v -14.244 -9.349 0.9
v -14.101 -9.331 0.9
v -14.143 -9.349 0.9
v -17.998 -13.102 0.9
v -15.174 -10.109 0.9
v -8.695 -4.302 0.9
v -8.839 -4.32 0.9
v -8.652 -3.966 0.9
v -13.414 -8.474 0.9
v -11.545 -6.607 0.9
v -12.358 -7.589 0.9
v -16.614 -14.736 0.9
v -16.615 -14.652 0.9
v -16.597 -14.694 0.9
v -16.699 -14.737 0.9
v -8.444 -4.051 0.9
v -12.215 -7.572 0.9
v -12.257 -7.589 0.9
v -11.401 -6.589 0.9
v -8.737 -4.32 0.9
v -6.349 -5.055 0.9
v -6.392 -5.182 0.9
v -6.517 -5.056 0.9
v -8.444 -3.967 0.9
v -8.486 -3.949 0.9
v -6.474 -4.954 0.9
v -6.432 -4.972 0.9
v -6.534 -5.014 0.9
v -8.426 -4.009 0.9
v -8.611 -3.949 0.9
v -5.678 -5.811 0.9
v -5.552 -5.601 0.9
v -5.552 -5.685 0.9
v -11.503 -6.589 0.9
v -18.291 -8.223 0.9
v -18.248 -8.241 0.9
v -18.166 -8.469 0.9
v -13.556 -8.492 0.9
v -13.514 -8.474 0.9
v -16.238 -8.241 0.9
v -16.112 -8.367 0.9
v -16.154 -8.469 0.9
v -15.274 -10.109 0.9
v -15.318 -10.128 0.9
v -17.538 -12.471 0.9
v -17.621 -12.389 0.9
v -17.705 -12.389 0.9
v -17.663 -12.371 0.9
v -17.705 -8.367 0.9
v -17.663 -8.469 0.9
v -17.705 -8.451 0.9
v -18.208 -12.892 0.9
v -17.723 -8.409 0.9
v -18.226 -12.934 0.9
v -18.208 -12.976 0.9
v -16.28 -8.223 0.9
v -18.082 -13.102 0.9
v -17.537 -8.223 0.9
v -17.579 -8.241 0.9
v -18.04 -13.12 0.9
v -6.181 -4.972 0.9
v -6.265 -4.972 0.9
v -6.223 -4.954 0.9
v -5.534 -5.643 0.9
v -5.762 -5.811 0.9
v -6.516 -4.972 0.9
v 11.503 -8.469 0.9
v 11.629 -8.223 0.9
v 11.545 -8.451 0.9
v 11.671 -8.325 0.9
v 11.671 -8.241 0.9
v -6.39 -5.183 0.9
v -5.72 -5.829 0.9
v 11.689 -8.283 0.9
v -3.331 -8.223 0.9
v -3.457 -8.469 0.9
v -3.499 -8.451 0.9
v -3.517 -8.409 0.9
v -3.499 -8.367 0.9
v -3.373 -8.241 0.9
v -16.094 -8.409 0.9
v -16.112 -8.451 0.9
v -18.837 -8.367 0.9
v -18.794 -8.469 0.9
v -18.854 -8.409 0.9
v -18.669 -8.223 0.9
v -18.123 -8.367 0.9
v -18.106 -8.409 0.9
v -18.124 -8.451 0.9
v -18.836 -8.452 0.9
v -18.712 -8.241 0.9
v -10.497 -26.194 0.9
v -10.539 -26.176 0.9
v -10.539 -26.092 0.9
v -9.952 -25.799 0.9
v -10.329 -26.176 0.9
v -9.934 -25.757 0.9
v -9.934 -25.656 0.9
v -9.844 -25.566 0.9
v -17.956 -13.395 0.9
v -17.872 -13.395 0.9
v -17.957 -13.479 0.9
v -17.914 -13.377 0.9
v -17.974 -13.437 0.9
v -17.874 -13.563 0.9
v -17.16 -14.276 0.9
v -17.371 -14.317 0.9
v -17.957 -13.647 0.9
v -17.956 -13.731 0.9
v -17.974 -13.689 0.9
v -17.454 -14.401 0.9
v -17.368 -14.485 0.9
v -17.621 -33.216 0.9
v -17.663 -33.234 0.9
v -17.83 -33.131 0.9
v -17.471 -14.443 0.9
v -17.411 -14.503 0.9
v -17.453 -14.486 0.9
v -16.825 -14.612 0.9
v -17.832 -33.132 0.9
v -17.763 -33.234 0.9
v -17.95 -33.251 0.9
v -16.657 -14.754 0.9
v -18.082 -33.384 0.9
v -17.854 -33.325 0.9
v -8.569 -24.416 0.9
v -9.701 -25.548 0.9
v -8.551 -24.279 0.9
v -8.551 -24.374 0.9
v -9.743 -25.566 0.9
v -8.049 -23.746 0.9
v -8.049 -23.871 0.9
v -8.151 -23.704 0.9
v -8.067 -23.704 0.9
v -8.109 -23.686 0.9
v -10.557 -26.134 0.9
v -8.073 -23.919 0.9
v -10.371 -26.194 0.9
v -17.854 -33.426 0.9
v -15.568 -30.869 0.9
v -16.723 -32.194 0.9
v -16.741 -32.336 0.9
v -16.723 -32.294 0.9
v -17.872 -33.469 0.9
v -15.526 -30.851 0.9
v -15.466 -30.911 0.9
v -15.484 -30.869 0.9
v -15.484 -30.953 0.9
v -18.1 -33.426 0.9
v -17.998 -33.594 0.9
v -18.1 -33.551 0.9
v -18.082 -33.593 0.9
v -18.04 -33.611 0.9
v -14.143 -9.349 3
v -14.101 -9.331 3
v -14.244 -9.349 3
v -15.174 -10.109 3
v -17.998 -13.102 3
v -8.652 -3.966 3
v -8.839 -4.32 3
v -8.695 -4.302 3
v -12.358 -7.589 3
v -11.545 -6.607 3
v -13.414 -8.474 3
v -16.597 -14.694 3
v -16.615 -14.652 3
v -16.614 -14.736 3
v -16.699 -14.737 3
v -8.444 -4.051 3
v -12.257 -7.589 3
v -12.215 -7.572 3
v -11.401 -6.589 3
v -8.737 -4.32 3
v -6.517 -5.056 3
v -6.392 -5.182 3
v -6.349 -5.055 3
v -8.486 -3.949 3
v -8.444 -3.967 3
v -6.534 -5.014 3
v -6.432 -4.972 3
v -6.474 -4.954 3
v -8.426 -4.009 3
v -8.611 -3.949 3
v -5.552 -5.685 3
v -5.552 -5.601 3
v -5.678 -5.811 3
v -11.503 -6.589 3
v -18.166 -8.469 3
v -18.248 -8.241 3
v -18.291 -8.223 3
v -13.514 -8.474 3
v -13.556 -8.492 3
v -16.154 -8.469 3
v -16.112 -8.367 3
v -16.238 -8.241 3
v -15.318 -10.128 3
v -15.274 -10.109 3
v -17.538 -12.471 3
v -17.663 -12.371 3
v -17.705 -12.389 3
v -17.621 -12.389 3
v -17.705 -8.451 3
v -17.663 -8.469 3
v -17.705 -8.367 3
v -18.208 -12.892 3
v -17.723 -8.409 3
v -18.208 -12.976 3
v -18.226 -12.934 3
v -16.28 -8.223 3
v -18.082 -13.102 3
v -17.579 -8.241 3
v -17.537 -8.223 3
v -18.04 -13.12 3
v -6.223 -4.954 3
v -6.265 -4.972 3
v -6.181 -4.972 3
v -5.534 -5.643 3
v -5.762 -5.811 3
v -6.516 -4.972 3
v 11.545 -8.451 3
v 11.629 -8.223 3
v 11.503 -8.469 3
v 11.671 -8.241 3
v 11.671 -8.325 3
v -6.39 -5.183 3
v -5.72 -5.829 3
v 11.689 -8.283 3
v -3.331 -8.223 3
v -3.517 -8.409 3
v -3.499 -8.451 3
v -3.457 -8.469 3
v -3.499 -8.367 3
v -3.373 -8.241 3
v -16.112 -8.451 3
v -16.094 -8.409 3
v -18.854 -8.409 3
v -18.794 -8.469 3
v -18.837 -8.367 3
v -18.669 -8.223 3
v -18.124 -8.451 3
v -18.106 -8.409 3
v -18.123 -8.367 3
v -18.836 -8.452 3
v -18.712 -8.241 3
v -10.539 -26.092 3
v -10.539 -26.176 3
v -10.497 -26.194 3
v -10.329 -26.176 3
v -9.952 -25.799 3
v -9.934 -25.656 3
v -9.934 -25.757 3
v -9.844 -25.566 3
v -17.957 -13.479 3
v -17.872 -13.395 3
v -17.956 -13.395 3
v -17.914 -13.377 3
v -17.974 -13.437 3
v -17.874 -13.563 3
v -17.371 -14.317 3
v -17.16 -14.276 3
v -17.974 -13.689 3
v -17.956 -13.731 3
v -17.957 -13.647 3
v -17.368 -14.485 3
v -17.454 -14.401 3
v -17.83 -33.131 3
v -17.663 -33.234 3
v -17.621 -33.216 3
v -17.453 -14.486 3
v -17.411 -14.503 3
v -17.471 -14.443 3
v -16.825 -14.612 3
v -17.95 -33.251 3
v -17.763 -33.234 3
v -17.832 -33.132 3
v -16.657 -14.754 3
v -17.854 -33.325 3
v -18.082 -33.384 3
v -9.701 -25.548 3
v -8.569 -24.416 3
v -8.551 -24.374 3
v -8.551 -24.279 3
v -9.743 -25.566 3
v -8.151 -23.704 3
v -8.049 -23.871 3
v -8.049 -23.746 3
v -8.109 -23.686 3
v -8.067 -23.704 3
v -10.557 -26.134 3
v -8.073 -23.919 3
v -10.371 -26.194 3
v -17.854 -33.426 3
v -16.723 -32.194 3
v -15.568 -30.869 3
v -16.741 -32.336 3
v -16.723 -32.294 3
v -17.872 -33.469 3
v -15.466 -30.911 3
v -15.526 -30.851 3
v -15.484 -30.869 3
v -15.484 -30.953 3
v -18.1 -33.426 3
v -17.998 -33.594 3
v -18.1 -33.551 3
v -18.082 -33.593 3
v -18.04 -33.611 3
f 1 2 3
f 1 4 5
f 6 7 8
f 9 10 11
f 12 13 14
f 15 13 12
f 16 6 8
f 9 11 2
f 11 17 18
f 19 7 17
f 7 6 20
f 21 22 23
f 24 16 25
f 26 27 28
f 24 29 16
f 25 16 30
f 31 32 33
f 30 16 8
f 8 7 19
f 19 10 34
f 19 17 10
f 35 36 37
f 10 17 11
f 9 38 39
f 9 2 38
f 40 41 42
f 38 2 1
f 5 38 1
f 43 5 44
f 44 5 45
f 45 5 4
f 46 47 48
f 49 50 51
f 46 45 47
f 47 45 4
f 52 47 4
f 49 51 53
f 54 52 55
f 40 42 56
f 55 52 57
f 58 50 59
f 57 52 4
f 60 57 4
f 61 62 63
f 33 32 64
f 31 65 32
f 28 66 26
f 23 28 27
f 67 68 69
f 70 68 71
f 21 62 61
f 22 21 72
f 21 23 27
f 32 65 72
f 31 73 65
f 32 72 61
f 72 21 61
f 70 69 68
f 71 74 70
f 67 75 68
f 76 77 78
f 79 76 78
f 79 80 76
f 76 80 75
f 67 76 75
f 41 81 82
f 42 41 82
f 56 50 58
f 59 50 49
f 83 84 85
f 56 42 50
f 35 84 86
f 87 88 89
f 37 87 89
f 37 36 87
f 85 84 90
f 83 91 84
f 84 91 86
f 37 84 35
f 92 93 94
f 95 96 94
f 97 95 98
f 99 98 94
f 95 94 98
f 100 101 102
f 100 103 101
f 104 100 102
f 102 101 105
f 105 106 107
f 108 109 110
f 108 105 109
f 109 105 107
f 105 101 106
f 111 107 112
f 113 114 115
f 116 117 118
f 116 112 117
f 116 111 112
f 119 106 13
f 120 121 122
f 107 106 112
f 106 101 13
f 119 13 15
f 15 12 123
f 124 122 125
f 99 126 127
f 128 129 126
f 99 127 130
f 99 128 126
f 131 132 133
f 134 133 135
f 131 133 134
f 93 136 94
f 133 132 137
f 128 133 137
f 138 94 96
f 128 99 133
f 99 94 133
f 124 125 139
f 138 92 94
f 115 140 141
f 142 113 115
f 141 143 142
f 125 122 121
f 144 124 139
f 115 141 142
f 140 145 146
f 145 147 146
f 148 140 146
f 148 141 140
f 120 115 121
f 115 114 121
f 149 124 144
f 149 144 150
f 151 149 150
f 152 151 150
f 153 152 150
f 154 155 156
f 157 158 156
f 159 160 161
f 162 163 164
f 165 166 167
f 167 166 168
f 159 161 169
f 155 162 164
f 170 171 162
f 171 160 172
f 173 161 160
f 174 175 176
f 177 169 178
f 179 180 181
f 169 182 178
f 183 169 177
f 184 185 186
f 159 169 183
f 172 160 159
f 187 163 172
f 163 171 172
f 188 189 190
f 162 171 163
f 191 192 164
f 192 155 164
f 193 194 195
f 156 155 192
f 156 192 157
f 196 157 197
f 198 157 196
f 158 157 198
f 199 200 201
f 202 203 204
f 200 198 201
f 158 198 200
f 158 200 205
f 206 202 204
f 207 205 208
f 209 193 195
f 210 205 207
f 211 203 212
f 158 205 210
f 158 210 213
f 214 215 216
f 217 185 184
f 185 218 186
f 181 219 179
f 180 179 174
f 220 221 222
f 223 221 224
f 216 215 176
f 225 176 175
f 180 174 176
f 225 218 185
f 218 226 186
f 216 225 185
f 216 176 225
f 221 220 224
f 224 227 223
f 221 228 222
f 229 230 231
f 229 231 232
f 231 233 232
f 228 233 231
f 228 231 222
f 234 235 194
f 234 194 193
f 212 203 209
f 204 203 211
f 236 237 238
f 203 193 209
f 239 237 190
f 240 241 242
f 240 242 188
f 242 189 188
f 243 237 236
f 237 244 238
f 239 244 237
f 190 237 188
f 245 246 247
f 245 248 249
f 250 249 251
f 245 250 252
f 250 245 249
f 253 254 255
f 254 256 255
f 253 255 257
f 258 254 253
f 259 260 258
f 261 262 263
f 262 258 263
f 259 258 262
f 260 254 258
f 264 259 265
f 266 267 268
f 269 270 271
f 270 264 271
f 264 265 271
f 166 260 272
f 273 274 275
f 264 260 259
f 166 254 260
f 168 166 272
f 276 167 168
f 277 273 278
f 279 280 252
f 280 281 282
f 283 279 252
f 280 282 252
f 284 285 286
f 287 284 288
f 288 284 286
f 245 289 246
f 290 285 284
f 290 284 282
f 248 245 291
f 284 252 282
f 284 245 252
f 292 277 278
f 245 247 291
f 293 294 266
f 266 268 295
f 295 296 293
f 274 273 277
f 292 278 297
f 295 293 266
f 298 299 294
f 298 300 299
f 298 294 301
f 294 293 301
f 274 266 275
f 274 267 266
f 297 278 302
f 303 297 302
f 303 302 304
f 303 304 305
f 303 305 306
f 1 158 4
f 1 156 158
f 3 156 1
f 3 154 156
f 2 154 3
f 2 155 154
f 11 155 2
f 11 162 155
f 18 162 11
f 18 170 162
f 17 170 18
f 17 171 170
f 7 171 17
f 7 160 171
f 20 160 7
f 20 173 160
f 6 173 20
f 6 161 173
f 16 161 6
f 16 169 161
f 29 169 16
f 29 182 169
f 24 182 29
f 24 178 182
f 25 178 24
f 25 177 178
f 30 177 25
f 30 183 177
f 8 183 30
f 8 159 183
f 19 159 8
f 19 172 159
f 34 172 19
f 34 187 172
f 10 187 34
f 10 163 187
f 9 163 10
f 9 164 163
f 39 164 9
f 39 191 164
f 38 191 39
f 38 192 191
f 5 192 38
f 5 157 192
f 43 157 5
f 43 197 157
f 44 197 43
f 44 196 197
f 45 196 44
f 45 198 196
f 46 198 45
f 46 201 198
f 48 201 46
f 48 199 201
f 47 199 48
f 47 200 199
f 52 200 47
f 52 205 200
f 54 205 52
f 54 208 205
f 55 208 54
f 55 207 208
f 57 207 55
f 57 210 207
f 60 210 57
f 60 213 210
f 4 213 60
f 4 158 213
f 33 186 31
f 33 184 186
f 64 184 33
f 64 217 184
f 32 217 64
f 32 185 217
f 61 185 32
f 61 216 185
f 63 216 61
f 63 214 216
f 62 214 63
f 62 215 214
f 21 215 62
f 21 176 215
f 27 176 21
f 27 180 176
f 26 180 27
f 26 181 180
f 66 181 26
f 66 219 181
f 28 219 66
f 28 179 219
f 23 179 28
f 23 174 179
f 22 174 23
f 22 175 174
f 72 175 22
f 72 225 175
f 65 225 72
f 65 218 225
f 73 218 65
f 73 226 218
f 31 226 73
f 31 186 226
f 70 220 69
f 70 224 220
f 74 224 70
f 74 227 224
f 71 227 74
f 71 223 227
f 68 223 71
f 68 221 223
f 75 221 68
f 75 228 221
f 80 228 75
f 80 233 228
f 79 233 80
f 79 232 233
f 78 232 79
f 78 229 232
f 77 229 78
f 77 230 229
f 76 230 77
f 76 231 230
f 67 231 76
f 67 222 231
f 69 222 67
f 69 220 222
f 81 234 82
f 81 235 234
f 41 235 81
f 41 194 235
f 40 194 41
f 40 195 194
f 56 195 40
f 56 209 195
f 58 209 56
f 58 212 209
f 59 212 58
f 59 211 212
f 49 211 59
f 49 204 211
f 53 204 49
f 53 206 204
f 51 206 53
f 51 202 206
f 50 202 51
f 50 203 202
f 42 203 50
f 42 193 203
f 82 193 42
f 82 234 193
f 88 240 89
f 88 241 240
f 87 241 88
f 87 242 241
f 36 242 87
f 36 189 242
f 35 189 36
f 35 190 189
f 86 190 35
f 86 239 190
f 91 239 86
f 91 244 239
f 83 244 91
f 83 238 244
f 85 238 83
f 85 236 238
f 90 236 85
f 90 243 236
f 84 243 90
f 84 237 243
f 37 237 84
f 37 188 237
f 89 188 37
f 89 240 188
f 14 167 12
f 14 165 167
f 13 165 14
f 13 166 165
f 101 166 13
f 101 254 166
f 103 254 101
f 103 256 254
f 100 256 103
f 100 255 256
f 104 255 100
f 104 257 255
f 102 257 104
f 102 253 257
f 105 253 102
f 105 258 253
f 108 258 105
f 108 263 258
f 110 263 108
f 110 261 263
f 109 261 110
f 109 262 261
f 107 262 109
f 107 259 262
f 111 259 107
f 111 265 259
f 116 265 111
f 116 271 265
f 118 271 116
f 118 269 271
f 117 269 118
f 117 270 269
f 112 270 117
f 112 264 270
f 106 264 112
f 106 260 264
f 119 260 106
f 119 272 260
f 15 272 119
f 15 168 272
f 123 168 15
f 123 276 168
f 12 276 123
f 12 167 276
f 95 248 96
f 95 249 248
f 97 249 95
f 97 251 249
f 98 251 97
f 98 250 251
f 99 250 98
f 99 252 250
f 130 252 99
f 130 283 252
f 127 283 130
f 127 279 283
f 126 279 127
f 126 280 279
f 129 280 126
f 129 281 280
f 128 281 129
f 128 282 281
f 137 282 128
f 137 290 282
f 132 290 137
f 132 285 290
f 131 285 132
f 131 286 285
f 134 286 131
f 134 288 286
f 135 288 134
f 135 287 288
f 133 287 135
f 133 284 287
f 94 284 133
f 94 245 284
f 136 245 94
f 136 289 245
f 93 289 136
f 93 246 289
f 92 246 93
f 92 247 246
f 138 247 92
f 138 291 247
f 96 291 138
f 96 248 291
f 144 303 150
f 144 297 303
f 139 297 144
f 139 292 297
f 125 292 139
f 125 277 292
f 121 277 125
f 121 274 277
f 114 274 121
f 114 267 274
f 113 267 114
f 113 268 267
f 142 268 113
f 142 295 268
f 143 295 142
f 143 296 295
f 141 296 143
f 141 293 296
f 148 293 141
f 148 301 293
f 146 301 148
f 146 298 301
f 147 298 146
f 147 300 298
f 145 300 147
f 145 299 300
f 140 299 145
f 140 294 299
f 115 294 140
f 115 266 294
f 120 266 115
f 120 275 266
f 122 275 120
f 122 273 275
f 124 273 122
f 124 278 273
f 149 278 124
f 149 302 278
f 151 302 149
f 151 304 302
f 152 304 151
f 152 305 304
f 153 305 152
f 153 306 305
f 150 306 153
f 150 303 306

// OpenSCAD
$fn = 24;
translate([0, -2.500, 0.900])
  linear_extrude(height=2.100) {
offset(r=0.06, $fn=8) {
    polygon(points=[[-15.526,-28.411],[-18.040,-30.926],[-18.040,-31.554],[-18.040,-31.051],[-17.914,-30.926],[-17.914,-30.800],[-17.789,-30.674],[-17.663,-30.674],[-16.783,-29.794],[-16.783,-29.669]], paths=[[0,1,2,3,4,5,6,7,8,9]]);
    polygon(points=[[-7.229,-20.366],[-11.000,-24.137],[-10.497,-23.634],[-10.371,-23.634],[-9.994,-23.257],[-9.994,-23.131],[-9.869,-23.006],[-9.743,-23.006],[-8.611,-21.874],[-8.611,-21.749],[-8.109,-21.371],[-8.109,-21.246]], paths=[[0,1,2,3,4,5,6,7,8,9,10,11]]);
    polygon(points=[[-18.166,-11.063],[-18.040,-11.189],[-17.914,-11.189],[-17.286,-11.817],[-17.411,-11.943],[-15.023,-14.331],[-17.034,-12.320],[-16.783,-12.069],[-16.657,-12.194],[-17.914,-10.937],[-17.789,-11.063],[-17.914,-11.189],[-18.040,-11.189],[-17.160,-11.691],[-16.783,-12.069],[-17.034,-12.320],[-17.411,-11.943]], paths=[[0,1,2,3,4,5,6,7,8,9,10,11,12],[13,14,15,16]]);
    polygon(points=[[-3.457,-5.909],[11.503,-5.909],[11.629,-5.783],[12.509,-5.783],[-3.331,-5.783]], paths=[[0,1,2,3,4]]);
    polygon(points=[[-16.154,-5.909],[-16.280,-5.783],[-17.537,-5.783],[-17.663,-5.909],[-18.166,-5.909],[-18.291,-5.783],[-18.669,-5.783],[-18.794,-5.909],[-30.234,-5.909]], paths=[[0,1,2,3,4,5,6,7,8]]);
    polygon(points=[[-6.474,-2.514],[-5.720,-3.269],[-5.594,-3.143],[-5.343,-3.394],[-6.223,-2.514],[-6.349,-2.640]], paths=[[0,1,2,3,4,5]]);
    polygon(points=[[-8.109,-1.257],[-8.234,-1.257],[-8.486,-1.509],[-8.611,-1.509],[-11.377,-4.149],[-11.503,-4.149],[-13.389,-6.034],[-13.514,-6.034],[-15.149,-7.669],[-15.274,-7.669],[-17.537,-10.057],[-17.663,-9.931],[-18.166,-10.434],[-18.040,-10.560],[-18.040,-10.686],[-18.040,-10.560],[-14.269,-6.789],[-14.143,-6.789],[-12.383,-5.029],[-12.257,-5.029],[-8.863,-1.760],[-8.737,-1.760],[-8.234,-1.257]], paths=[[0,1,2,3,4,5,6,7,8,9,10,11,12,13,14,15,16,17,18,19,20,21,22]]);
}
}
